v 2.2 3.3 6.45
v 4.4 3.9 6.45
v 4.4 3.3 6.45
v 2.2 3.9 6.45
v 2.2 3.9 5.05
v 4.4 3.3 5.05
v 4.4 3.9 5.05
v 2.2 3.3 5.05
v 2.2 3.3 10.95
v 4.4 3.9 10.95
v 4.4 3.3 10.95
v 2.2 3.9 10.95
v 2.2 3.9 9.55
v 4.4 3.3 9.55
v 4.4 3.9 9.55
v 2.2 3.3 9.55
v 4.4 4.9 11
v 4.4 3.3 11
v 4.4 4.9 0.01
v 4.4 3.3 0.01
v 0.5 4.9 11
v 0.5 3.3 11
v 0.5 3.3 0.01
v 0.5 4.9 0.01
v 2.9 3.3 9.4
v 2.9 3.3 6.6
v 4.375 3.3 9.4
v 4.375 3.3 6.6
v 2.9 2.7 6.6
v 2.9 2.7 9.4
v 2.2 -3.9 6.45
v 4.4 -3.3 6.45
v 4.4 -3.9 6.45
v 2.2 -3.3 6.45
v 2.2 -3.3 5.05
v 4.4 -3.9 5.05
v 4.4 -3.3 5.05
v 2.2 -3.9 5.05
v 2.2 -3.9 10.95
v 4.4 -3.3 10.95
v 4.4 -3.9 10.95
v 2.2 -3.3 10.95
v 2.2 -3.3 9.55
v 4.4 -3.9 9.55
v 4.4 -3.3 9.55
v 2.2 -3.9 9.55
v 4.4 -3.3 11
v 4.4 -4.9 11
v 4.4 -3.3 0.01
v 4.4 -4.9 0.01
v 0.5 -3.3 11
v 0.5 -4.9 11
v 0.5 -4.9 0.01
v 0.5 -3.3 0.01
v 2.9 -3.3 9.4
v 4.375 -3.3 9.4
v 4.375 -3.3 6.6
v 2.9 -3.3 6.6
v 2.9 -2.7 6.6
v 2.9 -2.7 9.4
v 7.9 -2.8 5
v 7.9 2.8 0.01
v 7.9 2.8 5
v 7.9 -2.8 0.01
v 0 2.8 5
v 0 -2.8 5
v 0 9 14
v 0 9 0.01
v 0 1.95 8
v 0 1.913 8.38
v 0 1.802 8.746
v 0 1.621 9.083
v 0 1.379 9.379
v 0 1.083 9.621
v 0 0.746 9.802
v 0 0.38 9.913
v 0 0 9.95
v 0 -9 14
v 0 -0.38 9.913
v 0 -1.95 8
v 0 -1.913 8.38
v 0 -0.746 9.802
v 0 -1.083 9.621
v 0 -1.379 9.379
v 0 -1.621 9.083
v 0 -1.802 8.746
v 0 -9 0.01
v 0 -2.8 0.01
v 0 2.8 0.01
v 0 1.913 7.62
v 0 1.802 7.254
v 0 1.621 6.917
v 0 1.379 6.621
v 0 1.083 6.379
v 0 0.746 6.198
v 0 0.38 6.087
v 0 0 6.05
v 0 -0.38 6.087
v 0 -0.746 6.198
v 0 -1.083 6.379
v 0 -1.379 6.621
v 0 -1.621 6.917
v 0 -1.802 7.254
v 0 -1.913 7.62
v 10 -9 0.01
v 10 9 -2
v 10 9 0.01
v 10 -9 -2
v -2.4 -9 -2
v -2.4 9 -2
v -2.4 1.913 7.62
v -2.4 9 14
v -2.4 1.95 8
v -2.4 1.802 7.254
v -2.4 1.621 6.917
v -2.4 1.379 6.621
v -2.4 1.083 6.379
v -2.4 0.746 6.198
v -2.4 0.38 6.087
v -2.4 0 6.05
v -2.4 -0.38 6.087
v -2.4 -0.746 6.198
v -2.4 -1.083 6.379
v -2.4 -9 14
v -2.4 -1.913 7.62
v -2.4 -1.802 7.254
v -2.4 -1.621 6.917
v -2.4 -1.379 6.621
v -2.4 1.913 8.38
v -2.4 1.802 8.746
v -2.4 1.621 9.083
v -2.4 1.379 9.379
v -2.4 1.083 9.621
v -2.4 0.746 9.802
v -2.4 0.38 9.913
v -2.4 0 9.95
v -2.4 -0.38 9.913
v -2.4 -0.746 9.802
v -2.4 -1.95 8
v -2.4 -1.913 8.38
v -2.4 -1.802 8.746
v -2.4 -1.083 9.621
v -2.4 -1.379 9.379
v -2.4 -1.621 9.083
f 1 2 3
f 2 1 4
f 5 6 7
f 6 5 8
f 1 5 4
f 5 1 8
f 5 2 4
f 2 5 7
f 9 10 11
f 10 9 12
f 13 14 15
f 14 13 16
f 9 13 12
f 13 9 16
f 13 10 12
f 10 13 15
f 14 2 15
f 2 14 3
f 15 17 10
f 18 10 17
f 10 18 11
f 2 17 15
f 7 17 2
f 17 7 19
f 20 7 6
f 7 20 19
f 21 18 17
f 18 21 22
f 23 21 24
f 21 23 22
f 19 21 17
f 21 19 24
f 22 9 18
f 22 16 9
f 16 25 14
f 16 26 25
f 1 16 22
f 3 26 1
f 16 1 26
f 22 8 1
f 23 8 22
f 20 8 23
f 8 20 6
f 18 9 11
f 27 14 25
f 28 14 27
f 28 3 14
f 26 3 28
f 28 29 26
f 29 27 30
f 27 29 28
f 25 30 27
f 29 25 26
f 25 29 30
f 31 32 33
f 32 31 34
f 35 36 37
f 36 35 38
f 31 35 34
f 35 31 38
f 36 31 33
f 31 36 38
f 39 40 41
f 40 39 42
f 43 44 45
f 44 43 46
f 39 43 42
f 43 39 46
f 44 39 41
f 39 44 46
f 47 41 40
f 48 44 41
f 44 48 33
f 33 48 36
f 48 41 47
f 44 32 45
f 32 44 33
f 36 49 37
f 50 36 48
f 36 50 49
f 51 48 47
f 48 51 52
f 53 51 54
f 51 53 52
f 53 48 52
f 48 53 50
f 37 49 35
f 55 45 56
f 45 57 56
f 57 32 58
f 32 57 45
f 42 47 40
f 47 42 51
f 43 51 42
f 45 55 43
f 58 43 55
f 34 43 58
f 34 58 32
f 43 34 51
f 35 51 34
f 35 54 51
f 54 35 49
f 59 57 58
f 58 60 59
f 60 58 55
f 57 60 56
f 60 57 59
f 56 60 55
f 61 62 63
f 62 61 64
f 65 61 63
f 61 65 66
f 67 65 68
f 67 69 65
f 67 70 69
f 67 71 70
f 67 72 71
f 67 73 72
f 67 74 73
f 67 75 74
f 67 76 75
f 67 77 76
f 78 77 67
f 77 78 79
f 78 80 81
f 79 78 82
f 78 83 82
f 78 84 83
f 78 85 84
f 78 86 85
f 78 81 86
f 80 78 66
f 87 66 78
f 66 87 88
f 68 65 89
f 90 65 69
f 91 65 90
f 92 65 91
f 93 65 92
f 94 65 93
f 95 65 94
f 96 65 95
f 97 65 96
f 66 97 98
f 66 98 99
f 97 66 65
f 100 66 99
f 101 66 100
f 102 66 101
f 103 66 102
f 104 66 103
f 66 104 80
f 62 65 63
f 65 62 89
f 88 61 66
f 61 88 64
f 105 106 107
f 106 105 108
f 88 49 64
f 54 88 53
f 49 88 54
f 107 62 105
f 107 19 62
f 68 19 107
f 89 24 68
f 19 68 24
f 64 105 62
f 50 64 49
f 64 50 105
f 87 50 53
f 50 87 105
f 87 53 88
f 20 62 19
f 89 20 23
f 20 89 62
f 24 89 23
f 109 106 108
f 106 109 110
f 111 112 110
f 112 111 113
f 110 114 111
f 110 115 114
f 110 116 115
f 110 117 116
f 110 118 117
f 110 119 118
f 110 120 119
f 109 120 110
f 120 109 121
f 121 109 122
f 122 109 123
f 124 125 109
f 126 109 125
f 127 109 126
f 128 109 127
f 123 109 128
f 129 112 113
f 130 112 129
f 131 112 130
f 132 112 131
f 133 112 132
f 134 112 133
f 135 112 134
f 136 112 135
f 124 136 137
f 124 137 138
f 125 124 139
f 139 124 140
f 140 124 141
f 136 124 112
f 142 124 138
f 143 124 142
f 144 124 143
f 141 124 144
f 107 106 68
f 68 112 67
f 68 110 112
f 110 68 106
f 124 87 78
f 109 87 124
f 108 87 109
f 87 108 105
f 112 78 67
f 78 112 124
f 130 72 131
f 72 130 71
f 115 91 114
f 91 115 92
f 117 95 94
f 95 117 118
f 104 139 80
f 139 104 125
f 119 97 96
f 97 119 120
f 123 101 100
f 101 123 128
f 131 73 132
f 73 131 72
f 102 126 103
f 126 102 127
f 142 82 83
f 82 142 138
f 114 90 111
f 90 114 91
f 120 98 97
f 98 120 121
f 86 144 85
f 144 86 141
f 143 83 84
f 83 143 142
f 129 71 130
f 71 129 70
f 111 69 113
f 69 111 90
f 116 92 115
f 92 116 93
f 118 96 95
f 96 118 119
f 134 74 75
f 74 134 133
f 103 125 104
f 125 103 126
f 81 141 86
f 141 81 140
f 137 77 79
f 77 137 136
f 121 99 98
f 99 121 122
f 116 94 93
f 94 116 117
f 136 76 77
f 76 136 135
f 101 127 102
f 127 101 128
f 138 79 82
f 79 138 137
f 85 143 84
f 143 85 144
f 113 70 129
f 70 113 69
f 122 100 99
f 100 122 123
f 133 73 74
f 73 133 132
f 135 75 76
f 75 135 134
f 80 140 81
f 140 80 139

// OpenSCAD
// file: ../tactile-6x6.scad
//-----------------------------------------------------------------------
// 6 x 6 tactile switch, mounted on its side with the stem through a wall
//
// Push in and click: sit the switch on the seat a few mm back from the wall,
// legs to the sides, and push it forward. The stem goes into a plain round
// hole; the body pushes two flexing cheeks apart and their teeth snap in
// behind it. The teeth then take the press.
//
// Three modules, all in the same frame:
//   tact6x6Ghost()    the switch, for previews
//   tact6x6Holder()   the plastic inside the box: seat, cheeks and teeth
//   tact6x6WallCut()  subtract from the wall: the stem hole
//
// Frame: origin on the floor top at the wall's inner face, under the stem
// axis. +X into the box, Z up. The wall is X = -wall .. 0. Units: mm.
//
// standoff moves the switch back from the wall: use it when a stem is longer
// than you want standing proud (tact6x6Proud() says how far it stands).
// Sizes: the kit's switches by name in tact6Sizes ("lp", "4.3" .. "13");
// tact6x6Standoff(name, wall, proud) gives the standoff for a wanted proud.
//
// Use with `use <.../components/tactile-6x6/tactile-6x6.scad>`; call the
// modules inside translate/rotate to place them.
//-----------------------------------------------------------------------

//-- The switch. Defaults: BOJACK 6 x 6 low-profile, measured 2026-10-30
tact6Body      = 6.0;     // body, square
tact6BodyH     = 2.8;     // body thickness, mounting face to back (measured)
tact6Stem      = 3.6;     // stem length past the body's face (6.4 overall, measured)
tact6StemDia   = 3.5;     // measured
tact6LegPitch  = 6.5;     // legs leave two opposite sides at the back edge, this far apart
tact6LegSpan   = 4.5;     // the two legs on one side, apart
tact6LegLength = 3.5;     // past the body's back
tact6LegW      = 0.7;

//-- The holder
tact6Clearance = 0.3;     // between the body and each cheek
tact6Tooth     = 0.6;     // how far each tooth reaches in behind the body: CAL by the fit piece
tact6ToothRamp = 1.5;     // lead-in length behind the catch
tact6CatchGap  = 0.1;     // body's back to the catch faces: snug, so a press clicks instead of shoving it back
tact6HoleClear = 0.4;     // stem hole over the stem diameter
tact6Cheek     = 1.6;     // cheek thickness
tact6CheekGap  = 0.5;     // between the seat and each cheek, so the cheeks flex from the floor
tact6LegGroove = 1.4;     // grooves in the cheeks for the legs (0.7 legs, with their kinks)
tact6Start     = 1.0;     // stem tip to the wall when the switch is set down, before the push

//-- Sizes: the BOJACK 6 x 6 kit (B07ZN11155), by name. [name, overall, body]
//-- overall: back of the body to the stem tip, the kit listing's height. Only "lp" is
//-- measured; the others assume a 3.5 body: CAL each before relying on it
tact6Sizes = [
  ["lp",   6.4, 2.8],     // the low-profile one, measured 2026-10-30 (the defaults above)
  ["4.3",  4.3, 3.5],
  ["5",    5.0, 3.5],
  ["6",    6.0, 3.5],
  ["7",    7.0, 3.5],
  ["8",    8.0, 3.5],
  ["9",    9.0, 3.5],
  ["10",  10.0, 3.5],
  ["11",  11.0, 3.5],
  ["12",  12.0, 3.5],
  ["13",  13.0, 3.5],
];

function tact6Size(name) = let (i = search([name], tact6Sizes)[0])
  assert(i != [] && i != undef, str("unknown 6x6 size ", name)) tact6Sizes[i];
function tact6BodyHOf(name) = tact6Size(name)[2];
function tact6StemOf(name)  = tact6Size(name)[1] - tact6Size(name)[2];

//-- how far the stem stands proud of the wall's outer face
function tact6x6Proud(wall, standoff = 0, stem = tact6Stem) = stem - wall - standoff;

//-- the standoff that leaves a named switch's stem `proud` past a `wall`. Pass it to the
//-- modules with bodyH = tact6BodyHOf(name), stem = tact6StemOf(name)
function tact6x6Standoff(name, wall, proud) =
  let (s = tact6StemOf(name) - wall - proud)
  assert(s > -0.01, str("the ", name, " switch's stem is too short to stand ", proud, " past a ", wall, " wall"))
  max(s, 0);

//-- axisZ: stem axis above the floor; at least tact6Body/2 + 1
module tact6x6Ghost(axisZ, standoff = 0, bodyH = tact6BodyH, stem = tact6Stem)
{
  translate([standoff, 0, 0])
  {
    %color("DimGray") translate([0, -tact6Body/2, axisZ - tact6Body/2]) cube([bodyH, tact6Body, tact6Body]);
    %color("Black") translate([0, 0, axisZ]) rotate([0, -90, 0]) cylinder(d = tact6StemDia, h = stem, $fn = 24);
    for (s = [-1, 1], z = [-1, 1])
      %color("Silver") translate([bodyH, s*tact6LegPitch/2 - tact6LegW/2, axisZ + z*tact6LegSpan/2 - tact6LegW/2])
        cube([tact6LegLength, tact6LegW, tact6LegW]);
  }
}

module tact6x6Holder(axisZ, standoff = 0, clearance = tact6Clearance, tooth = tact6Tooth,
                     bodyH = tact6BodyH, stem = tact6Stem)
{
  half    = tact6Body/2;
  inner   = half + clearance;                       // cheek inner faces
  seatW   = inner - tact6CheekGap;                  // seat half-width: the cheeks clear it
  seatTop = axisZ - half;                           // the body rests on it, stem on the axis
  catchX  = standoff + bodyH + tact6CatchGap;       // teeth's catch faces, behind the body
  startX  = max(standoff + stem + tact6Start, catchX + tact6ToothRamp);   // body front when set down
  cheekX0 = max(standoff, 0.5);                     // clear of the wall, so the cheeks flex
  cheekX1 = catchX + tact6ToothRamp;
  legOut  = tact6LegPitch/2 + tact6LegW/2 + 0.3;    // groove depth: outside the legs and their kinks
  toothH  = tact6LegSpan - tact6LegGroove - 0.3;    // fits between the leg grooves
  assert(axisZ >= half + 1, "axisZ too low for the seat");

  //-- seat, from the wall back past where the switch is set down
  translate([0, -seatW, 0]) cube([startX + bodyH + 0.5, 2*seatW, seatTop]);
  //-- front stop when the body sits back from the wall
  if (standoff > 0)
    translate([standoff - 1.2, -seatW, 0]) cube([1.2, 2*seatW, seatTop + 1.5]);
  for (m = [0, 1])
    mirror([0, m, 0])
    {
      difference()
      {
        //-- cheek, from the floor to the body's top
        translate([cheekX0, inner, 0]) cube([cheekX1 - cheekX0, tact6Cheek, axisZ + half]);
        //-- grooves the legs slide along, open at the back
        for (z = [-1, 1])
          translate([standoff + bodyH - 0.6, inner - 1, axisZ + z*tact6LegSpan/2 - tact6LegGroove/2])
            cube([cheekX1, 1 + legOut - inner, tact6LegGroove]);
      }
      //-- tooth between the leg grooves: square catch face forward, ramp behind
      translate([0, 0, axisZ - toothH/2])
        linear_extrude(toothH)
          polygon([[catchX, inner + 0.01], [catchX, inner - tooth], [catchX + tact6ToothRamp, inner + 0.01]]);
    }
}

module tact6x6WallCut(axisZ, wall)
{
  translate([-wall - 1, 0, axisZ]) rotate([0, 90, 0])
    cylinder(d = tact6StemDia + tact6HoleClear, h = wall + 2, $fn = 32);
}
// main file
// One holder on a short piece of wall and floor, for the catalogue.
use <../tactile-6x6.scad>

wall  = 2.4;
axisZ = 8;

difference()
{
  union()
  {
    translate([-wall, -9, -2]) cube([wall + 10, 18, 2.01]);
    translate([-wall, -9, 0]) cube([wall, 18, axisZ + 6]);
    translate([0, 0, -0.01]) tact6x6Holder(axisZ + 0.01);
  }
  tact6x6WallCut(axisZ, wall);
}
